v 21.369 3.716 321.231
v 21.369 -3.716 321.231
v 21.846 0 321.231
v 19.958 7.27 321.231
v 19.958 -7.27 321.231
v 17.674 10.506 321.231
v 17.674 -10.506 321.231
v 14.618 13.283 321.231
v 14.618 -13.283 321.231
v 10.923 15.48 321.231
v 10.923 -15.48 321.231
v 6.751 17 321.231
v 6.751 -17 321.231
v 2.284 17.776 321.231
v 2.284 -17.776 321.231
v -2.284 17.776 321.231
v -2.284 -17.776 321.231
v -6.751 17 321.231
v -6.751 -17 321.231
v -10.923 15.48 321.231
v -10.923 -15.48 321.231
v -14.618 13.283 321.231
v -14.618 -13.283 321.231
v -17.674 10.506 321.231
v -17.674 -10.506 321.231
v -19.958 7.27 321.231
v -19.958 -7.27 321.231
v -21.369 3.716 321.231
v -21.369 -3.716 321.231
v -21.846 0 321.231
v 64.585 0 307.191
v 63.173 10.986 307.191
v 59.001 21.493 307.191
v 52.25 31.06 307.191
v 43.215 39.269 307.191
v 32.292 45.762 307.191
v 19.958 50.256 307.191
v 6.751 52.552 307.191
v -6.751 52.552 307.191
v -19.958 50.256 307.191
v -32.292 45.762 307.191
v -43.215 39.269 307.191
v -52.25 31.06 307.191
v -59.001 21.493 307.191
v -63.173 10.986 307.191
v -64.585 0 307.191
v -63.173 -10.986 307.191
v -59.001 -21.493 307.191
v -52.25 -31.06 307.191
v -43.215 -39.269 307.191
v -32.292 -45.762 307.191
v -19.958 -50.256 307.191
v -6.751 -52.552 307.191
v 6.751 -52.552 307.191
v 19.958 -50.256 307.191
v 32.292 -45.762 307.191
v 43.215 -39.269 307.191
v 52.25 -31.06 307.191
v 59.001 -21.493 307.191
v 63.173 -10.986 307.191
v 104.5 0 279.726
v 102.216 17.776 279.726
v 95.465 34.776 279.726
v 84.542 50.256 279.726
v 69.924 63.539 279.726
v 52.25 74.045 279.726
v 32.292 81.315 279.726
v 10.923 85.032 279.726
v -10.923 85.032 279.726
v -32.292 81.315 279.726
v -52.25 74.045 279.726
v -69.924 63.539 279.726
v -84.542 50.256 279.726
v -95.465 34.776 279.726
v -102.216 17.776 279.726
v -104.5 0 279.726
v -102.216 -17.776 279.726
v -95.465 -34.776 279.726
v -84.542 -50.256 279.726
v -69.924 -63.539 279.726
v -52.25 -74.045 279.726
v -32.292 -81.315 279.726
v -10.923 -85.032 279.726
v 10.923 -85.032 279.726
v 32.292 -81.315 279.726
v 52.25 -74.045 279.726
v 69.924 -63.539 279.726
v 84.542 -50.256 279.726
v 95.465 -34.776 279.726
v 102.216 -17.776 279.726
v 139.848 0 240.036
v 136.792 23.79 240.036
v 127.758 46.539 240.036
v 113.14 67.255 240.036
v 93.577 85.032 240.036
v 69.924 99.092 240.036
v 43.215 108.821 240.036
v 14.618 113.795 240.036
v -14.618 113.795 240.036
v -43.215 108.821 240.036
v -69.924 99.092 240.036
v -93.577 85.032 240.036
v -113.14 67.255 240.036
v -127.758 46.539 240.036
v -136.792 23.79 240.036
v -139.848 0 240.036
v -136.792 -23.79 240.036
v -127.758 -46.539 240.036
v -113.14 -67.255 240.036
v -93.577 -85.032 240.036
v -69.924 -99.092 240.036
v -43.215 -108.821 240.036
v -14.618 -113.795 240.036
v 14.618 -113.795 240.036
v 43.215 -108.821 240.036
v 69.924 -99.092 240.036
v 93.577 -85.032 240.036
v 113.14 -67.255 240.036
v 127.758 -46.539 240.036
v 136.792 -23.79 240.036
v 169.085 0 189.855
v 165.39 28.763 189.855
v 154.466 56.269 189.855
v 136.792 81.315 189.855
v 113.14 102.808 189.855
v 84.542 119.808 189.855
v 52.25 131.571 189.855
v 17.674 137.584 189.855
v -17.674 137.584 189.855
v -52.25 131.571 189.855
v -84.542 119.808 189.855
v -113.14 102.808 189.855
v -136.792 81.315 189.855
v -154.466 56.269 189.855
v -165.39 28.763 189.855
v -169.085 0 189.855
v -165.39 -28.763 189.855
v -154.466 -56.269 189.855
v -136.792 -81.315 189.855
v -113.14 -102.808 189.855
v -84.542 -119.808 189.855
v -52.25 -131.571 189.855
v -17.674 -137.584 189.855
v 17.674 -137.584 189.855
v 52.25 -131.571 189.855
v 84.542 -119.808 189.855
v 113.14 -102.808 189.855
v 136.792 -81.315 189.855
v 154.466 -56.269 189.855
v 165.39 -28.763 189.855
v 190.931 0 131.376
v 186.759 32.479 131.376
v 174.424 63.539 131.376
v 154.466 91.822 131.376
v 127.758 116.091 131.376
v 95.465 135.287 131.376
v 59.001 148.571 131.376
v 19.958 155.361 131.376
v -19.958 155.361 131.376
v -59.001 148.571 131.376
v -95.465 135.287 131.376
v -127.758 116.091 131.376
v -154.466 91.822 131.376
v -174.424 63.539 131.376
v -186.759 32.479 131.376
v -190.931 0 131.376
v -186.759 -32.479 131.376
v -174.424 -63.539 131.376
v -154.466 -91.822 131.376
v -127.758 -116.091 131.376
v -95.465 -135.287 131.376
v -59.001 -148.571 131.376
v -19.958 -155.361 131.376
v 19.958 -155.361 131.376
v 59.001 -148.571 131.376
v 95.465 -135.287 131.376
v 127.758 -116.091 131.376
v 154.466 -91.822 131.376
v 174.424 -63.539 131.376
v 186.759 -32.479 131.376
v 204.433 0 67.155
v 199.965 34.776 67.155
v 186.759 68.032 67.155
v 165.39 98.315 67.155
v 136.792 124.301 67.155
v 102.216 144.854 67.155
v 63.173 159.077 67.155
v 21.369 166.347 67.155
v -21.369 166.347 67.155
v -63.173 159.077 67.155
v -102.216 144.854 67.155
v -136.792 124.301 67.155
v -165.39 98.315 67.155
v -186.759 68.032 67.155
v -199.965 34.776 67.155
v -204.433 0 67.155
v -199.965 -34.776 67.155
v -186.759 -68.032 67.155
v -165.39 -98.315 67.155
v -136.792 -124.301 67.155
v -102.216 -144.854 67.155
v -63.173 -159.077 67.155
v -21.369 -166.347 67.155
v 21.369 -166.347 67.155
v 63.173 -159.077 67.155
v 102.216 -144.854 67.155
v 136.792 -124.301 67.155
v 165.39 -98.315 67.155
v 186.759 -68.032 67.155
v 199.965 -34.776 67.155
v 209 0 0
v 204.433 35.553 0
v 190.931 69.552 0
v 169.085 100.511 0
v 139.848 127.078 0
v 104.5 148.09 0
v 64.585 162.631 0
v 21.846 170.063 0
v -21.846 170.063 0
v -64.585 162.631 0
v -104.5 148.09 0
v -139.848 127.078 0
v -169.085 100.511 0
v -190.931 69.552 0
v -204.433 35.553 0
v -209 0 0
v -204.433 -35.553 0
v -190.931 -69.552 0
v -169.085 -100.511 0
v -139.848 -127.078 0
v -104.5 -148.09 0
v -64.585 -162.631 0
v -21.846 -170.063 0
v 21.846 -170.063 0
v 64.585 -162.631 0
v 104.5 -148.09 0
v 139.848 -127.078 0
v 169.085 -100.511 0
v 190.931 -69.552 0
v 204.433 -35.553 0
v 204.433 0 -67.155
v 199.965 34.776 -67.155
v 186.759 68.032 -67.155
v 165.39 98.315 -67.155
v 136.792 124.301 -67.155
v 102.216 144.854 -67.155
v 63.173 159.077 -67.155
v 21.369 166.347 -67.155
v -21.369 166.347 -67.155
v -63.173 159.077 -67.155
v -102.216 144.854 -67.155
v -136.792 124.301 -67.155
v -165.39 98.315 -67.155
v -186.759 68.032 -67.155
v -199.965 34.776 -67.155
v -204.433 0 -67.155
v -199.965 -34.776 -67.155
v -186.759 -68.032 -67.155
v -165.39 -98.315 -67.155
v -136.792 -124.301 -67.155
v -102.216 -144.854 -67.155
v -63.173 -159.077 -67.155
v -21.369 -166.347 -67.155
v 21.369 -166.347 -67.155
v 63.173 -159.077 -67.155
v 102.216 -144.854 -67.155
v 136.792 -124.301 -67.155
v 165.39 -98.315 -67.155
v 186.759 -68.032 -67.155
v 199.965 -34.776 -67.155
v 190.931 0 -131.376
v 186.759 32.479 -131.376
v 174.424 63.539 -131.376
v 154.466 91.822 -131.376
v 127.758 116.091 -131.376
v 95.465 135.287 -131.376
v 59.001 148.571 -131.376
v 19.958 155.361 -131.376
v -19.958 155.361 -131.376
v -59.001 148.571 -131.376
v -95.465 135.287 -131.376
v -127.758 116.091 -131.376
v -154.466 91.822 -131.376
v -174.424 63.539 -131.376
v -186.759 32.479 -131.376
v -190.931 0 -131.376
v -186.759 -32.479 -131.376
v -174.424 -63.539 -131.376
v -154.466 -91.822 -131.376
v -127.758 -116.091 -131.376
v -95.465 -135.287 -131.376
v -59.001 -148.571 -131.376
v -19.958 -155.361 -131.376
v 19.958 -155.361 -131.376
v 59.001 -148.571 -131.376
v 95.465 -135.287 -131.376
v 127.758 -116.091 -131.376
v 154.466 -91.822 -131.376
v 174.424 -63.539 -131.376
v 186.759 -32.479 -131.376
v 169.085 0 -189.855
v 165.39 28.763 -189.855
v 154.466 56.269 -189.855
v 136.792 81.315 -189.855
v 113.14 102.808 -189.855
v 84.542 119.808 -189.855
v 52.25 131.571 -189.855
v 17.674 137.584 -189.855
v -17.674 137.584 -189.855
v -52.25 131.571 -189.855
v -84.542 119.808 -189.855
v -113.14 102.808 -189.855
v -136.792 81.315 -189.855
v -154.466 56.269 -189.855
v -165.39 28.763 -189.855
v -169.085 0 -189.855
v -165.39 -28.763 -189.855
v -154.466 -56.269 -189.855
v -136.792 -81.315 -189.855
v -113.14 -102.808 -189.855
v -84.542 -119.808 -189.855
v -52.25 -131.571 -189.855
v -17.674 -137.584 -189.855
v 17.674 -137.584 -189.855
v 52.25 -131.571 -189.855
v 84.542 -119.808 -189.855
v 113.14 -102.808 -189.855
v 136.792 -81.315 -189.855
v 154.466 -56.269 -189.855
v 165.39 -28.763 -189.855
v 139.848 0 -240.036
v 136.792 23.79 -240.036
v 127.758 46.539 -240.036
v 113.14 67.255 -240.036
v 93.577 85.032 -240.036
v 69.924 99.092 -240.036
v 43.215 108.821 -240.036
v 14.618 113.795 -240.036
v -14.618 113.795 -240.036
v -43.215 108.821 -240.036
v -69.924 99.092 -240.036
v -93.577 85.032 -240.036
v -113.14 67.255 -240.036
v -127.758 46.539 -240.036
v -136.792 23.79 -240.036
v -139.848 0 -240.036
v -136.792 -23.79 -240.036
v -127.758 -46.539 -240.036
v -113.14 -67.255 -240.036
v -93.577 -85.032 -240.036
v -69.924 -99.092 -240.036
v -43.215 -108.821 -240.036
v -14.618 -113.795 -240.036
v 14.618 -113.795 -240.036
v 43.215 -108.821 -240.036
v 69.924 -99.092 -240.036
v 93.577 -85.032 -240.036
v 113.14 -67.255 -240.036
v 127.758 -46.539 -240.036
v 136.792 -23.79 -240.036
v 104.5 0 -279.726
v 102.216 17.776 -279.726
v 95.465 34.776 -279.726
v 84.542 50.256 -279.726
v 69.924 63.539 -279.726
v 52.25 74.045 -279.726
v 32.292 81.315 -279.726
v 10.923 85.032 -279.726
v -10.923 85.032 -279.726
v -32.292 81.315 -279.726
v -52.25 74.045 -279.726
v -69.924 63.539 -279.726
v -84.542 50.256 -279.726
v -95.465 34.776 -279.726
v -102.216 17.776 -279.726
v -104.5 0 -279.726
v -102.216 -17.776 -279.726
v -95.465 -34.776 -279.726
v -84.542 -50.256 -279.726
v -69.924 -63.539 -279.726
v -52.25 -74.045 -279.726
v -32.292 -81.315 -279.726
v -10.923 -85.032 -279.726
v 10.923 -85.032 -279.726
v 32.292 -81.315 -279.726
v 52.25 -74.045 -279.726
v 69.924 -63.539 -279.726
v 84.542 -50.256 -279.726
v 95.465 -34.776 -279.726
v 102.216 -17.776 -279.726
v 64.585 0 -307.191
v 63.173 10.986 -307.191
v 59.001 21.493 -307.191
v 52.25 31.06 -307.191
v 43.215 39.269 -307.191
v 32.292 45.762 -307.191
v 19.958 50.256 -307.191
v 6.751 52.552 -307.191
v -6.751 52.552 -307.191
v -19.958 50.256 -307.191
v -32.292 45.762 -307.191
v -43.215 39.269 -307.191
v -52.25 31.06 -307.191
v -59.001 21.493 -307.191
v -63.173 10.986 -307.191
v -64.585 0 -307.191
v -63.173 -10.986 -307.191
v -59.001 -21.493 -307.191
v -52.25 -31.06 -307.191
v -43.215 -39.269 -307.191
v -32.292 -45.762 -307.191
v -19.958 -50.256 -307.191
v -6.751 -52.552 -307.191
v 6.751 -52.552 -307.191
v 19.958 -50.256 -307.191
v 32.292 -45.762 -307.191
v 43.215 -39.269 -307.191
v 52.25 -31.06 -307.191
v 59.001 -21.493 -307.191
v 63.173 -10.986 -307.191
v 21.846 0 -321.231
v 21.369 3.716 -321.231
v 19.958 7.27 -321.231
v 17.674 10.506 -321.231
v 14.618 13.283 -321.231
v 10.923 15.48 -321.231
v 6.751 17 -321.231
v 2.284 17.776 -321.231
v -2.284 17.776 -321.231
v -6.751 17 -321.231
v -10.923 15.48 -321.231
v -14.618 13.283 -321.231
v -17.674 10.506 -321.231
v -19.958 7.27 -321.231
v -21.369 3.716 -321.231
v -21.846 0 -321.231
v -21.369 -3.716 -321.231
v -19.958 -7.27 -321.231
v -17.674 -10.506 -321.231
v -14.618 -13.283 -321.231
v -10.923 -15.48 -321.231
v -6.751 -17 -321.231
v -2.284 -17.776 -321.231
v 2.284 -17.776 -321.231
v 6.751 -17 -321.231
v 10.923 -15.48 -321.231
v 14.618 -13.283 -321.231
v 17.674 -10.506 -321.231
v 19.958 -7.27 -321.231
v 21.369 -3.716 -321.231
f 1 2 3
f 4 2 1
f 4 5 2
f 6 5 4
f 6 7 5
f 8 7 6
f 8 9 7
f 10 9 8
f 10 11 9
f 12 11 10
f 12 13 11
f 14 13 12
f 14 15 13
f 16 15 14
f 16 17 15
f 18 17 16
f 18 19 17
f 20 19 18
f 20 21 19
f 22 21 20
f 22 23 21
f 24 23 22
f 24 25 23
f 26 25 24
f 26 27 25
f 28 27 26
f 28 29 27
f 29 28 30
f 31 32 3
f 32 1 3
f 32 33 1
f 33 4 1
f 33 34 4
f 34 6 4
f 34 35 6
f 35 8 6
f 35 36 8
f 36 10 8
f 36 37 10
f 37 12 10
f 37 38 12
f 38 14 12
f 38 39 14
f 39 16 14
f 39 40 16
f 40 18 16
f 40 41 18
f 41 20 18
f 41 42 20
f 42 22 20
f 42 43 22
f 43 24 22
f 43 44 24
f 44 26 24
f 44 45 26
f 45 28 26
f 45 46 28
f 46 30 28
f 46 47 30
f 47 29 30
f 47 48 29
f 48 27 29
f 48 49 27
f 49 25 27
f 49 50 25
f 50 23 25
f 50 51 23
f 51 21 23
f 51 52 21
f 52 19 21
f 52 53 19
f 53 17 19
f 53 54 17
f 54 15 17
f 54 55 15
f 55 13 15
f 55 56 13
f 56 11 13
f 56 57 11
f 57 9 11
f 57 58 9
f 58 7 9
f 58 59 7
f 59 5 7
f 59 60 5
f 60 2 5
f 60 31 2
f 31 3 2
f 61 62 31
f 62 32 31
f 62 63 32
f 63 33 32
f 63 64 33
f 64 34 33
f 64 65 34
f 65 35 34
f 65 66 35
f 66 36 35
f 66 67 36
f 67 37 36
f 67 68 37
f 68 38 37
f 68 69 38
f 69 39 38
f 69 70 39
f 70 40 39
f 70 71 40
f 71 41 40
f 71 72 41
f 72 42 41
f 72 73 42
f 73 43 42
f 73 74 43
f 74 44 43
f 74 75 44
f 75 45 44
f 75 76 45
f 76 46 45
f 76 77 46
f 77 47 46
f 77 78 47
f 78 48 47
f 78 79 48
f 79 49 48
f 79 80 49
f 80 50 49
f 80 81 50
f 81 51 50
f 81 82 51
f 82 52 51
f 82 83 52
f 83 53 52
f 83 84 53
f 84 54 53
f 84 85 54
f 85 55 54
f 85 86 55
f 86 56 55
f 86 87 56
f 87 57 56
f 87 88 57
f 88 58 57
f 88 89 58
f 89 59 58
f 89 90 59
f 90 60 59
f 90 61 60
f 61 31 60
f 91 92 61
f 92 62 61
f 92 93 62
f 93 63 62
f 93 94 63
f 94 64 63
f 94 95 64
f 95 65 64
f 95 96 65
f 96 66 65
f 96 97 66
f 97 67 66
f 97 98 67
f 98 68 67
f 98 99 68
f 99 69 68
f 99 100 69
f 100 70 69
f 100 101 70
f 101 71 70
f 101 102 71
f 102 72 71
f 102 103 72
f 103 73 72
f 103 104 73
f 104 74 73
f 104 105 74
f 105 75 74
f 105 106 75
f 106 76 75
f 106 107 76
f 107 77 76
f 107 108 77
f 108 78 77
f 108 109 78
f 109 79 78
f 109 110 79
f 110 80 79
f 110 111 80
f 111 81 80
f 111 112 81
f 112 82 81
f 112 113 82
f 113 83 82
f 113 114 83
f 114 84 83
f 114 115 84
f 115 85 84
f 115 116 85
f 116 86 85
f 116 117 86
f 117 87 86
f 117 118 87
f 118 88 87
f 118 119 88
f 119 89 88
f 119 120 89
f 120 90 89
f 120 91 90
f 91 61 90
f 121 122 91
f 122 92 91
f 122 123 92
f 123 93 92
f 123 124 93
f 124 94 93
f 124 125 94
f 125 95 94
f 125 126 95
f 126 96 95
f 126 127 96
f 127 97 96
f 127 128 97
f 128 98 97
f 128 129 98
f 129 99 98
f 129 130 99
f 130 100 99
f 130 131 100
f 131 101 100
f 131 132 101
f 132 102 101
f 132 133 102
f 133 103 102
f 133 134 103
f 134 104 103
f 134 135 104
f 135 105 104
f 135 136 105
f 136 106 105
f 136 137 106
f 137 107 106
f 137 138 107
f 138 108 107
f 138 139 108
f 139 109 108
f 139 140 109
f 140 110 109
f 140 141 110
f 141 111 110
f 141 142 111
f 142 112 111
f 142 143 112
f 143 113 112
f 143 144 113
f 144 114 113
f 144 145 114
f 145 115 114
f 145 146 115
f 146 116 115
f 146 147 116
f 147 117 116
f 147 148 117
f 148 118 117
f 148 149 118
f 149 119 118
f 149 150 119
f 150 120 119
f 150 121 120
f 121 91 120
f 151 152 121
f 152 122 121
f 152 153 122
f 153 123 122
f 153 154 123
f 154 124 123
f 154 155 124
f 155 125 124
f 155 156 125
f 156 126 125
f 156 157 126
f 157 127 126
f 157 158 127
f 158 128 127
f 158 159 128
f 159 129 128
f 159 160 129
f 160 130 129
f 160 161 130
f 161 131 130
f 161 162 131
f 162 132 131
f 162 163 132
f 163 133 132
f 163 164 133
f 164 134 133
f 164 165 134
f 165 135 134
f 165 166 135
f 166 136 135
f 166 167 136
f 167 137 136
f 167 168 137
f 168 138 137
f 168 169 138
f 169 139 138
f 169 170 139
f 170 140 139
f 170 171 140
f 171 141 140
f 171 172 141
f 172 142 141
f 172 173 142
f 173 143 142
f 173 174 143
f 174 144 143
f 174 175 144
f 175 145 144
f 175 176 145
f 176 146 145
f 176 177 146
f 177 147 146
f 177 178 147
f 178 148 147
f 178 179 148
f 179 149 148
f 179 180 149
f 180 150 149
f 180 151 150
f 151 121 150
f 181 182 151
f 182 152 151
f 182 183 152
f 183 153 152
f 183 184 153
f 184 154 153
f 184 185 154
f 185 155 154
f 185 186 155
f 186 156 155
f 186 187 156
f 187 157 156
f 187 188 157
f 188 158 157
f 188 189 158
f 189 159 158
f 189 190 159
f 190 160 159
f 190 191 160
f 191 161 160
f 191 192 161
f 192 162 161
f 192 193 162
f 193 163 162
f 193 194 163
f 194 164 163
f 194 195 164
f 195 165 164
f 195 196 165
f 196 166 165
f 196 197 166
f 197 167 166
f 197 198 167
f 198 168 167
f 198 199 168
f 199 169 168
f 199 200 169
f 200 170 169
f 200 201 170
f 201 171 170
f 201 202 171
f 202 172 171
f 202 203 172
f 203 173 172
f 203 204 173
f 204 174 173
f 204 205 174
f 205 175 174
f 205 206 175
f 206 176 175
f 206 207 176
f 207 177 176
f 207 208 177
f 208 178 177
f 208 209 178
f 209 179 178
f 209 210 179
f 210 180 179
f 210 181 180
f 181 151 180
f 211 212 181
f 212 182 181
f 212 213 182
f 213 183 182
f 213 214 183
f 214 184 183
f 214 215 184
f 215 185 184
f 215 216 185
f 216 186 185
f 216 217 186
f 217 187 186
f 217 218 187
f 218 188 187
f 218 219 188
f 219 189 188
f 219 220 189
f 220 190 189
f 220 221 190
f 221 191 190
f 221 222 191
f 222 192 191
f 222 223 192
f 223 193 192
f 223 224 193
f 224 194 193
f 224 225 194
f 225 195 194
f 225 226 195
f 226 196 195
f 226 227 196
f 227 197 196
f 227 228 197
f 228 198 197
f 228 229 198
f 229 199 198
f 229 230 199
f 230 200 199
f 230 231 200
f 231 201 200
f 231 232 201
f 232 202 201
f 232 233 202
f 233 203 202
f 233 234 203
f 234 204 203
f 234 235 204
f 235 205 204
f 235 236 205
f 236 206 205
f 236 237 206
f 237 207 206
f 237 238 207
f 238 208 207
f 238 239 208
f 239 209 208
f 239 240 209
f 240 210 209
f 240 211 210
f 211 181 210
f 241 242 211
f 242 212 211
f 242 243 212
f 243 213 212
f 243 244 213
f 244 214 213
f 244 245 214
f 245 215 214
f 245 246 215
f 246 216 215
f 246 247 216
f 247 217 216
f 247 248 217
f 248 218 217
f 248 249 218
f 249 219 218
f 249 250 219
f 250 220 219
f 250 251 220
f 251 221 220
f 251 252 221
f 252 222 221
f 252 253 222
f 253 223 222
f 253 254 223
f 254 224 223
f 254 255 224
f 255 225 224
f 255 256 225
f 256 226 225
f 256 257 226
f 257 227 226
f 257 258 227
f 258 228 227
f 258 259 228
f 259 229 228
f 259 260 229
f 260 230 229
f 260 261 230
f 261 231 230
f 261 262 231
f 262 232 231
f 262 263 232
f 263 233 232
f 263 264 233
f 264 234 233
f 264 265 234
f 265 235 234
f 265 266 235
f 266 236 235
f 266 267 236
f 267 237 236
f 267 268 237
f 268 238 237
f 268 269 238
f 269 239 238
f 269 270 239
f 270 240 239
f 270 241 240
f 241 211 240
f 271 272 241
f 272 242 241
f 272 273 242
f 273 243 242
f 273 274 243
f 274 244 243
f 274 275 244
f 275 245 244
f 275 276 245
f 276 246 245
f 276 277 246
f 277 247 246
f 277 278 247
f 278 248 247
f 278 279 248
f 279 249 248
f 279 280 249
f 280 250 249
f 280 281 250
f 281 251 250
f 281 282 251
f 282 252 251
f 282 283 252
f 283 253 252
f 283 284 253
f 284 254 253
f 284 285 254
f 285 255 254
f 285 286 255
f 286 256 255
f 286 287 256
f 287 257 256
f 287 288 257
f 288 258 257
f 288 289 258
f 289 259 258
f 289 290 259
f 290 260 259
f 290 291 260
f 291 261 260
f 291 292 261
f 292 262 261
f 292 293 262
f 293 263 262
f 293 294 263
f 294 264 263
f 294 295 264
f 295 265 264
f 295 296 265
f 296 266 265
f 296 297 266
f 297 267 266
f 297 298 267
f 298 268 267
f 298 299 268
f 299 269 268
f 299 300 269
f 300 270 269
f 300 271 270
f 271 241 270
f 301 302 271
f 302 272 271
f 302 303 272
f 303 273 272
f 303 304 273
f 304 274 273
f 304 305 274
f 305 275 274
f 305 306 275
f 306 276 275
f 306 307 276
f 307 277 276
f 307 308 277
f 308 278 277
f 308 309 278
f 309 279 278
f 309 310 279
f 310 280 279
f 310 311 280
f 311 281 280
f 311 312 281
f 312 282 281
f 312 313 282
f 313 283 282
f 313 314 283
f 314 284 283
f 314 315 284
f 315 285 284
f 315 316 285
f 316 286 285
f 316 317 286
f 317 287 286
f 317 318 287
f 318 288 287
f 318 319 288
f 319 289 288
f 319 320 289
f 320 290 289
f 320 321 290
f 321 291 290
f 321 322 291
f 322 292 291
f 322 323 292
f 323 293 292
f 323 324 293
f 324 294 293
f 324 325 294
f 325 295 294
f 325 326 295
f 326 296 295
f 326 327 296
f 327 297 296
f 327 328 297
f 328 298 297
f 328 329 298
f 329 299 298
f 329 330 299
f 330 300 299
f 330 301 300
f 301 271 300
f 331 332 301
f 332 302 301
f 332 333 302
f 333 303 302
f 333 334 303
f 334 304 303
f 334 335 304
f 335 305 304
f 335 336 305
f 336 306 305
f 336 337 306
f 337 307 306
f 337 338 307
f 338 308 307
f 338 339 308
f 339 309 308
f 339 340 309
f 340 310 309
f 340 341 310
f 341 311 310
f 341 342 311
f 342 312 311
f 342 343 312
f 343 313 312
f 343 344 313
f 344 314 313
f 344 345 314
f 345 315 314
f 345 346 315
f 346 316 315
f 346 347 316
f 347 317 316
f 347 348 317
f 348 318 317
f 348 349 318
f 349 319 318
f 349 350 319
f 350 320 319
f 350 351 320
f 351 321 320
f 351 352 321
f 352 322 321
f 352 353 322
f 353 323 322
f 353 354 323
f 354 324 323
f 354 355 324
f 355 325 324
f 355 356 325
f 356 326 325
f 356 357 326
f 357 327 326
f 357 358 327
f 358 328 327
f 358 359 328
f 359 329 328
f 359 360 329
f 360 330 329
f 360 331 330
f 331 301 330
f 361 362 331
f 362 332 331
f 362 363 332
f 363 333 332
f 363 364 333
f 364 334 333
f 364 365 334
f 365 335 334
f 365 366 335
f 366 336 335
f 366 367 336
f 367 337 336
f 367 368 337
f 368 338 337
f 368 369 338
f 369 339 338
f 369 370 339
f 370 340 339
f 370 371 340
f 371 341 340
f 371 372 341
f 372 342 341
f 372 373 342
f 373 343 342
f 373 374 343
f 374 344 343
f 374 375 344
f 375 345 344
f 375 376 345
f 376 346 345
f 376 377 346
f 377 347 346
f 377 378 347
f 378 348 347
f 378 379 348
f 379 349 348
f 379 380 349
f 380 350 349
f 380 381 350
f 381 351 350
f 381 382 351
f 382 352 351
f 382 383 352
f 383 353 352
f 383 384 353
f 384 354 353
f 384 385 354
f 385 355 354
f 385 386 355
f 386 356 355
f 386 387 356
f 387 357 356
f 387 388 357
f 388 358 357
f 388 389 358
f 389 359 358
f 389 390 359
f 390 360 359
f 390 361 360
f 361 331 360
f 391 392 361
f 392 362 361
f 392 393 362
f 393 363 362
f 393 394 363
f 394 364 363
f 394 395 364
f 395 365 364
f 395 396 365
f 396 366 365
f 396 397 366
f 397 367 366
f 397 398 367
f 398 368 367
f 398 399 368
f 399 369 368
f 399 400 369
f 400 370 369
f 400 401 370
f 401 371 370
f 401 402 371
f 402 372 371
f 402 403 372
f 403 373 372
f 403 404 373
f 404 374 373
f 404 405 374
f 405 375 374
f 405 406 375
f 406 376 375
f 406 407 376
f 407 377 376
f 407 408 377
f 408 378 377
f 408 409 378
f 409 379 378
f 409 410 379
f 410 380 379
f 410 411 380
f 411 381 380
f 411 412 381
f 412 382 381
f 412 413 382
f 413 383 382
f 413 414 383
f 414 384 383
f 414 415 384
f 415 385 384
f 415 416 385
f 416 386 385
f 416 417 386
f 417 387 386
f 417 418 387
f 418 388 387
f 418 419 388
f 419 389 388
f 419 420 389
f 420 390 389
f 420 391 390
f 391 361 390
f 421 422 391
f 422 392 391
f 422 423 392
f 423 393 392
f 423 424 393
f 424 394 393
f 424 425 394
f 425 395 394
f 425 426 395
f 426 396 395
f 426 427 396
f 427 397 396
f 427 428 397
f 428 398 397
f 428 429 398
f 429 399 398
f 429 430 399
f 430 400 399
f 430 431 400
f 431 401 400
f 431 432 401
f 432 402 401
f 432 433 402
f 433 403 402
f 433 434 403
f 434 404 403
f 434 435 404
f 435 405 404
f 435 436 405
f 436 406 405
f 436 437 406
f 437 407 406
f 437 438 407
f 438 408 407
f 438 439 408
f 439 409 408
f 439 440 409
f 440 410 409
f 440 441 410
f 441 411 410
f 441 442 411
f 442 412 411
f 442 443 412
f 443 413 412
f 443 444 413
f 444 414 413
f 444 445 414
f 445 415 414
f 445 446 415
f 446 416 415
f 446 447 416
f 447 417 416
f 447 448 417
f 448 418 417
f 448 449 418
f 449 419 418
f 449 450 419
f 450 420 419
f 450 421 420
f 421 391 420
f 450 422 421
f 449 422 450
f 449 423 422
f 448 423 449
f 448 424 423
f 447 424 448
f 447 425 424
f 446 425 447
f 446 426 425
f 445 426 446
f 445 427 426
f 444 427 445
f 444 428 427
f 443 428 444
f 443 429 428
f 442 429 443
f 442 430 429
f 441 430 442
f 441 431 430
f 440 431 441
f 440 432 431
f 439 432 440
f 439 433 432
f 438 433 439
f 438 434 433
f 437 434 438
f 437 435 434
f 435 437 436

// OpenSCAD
// Generated by SolidPython 1.0.1 on 2020-07-29 00:46:49


scale(v = [11, 9, 17]) {
	sphere(r = 19);
}
/***********************************************
*********      SolidPython code:      **********
************************************************
 
# import packages: SolidPython
from solid import *
from solid.utils import *
from itertools import chain, combinations, permutations


class Resize:

    def __init__(self, scad_file):
        self.scad_file = scad_file
        #self.scad_file = import_scad(scad_file)
        # cone/cylinder param:
        self.r1 = 0
        self.r2 = 0
        self.h = 0
        # rectangular prism param:
        self.w = 0
        self.l = 0
        # ellipse param:
        self.r = 0

    # import OpenScad code (file name corresponds to shape)


    # classify shape + parameters
    def assign(self, param1, param2, param3):
        if self.scad_file == 'cone.scad':
            self.r1 = param1
            self.r2 = param2
            self.h = param3
        elif self.scad_file == 'cylinder.scad':
            self.r1 = param1
            self.r2 = param2
            self.h = param3
        elif self.scad_file == 'rectangularPrism.scad':
            self.h = param1
            self.l = param2
            self.w = param3
        else:
            self.r = param1
            self.h = param2

    # resize parameters
    def iterate(self):
        x = range(3, 20, 2)
        i = 1
        if self.scad_file == 'cone.scad':
            tempList = list(permutations(x, 2))
            for temp in tempList:
                param1 = temp[0]
                param2 = temp[1]
                filepath = 'produced_scad_files/' + 'cone' + str(param1) + '_' + str(param2) + '_' + '.scad'
                scad_render_to_file(cylinder(h=param1, r1=param2, r2=0), filepath)

        elif self.scad_file == 'cylinder.scad':
            tempList = list(permutations(x, 3))
            for temp in tempList:
                param1 = temp[0]
                param2 = temp[1]
                filepath = 'produced_scad_files/' + 'cylinder' + str(param1) + '_' + str(param2) + '_' + '.scad'
                scad_render_to_file(cylinder(h=param1, r1=param2, r2=param2), filepath)

        elif self.scad_file == 'rectangularPrism.scad':
            tempList = list(permutations(x, 3))
            for temp in tempList:
                param1 = temp[0]
                param2 = temp[1]
                param3 = temp[2]
                filepath = 'produced_scad_files/' + 'rectangularPrism' + str(param1) + '_' + str(param2) + '_' + str(
                    param3) + '.scad'
                scad_render_to_file(cube(size=(param1, param2, param3)), filepath)

        elif self.scad_file == 'ellipse.scad':
            tempList = list(permutations(x, 4))
            for temp in tempList:
                param1 = temp[0]
                param2 = temp[1]
                param3 = temp[2]
                param4 = temp[3]
                filepath = 'produced_scad_files/' + 'ellipse' + str(param1) + '_' + str(param2) + '_' + str(param3) + '_' + str(param4) + '.scad'
                scad_render_to_file(scale([param1, param2, param3])(sphere(r=param4)), filepath)

    def render_to_scadfile(self):
        scad_render_to_file(scad, 'example.scad') 
 
************************************************/
